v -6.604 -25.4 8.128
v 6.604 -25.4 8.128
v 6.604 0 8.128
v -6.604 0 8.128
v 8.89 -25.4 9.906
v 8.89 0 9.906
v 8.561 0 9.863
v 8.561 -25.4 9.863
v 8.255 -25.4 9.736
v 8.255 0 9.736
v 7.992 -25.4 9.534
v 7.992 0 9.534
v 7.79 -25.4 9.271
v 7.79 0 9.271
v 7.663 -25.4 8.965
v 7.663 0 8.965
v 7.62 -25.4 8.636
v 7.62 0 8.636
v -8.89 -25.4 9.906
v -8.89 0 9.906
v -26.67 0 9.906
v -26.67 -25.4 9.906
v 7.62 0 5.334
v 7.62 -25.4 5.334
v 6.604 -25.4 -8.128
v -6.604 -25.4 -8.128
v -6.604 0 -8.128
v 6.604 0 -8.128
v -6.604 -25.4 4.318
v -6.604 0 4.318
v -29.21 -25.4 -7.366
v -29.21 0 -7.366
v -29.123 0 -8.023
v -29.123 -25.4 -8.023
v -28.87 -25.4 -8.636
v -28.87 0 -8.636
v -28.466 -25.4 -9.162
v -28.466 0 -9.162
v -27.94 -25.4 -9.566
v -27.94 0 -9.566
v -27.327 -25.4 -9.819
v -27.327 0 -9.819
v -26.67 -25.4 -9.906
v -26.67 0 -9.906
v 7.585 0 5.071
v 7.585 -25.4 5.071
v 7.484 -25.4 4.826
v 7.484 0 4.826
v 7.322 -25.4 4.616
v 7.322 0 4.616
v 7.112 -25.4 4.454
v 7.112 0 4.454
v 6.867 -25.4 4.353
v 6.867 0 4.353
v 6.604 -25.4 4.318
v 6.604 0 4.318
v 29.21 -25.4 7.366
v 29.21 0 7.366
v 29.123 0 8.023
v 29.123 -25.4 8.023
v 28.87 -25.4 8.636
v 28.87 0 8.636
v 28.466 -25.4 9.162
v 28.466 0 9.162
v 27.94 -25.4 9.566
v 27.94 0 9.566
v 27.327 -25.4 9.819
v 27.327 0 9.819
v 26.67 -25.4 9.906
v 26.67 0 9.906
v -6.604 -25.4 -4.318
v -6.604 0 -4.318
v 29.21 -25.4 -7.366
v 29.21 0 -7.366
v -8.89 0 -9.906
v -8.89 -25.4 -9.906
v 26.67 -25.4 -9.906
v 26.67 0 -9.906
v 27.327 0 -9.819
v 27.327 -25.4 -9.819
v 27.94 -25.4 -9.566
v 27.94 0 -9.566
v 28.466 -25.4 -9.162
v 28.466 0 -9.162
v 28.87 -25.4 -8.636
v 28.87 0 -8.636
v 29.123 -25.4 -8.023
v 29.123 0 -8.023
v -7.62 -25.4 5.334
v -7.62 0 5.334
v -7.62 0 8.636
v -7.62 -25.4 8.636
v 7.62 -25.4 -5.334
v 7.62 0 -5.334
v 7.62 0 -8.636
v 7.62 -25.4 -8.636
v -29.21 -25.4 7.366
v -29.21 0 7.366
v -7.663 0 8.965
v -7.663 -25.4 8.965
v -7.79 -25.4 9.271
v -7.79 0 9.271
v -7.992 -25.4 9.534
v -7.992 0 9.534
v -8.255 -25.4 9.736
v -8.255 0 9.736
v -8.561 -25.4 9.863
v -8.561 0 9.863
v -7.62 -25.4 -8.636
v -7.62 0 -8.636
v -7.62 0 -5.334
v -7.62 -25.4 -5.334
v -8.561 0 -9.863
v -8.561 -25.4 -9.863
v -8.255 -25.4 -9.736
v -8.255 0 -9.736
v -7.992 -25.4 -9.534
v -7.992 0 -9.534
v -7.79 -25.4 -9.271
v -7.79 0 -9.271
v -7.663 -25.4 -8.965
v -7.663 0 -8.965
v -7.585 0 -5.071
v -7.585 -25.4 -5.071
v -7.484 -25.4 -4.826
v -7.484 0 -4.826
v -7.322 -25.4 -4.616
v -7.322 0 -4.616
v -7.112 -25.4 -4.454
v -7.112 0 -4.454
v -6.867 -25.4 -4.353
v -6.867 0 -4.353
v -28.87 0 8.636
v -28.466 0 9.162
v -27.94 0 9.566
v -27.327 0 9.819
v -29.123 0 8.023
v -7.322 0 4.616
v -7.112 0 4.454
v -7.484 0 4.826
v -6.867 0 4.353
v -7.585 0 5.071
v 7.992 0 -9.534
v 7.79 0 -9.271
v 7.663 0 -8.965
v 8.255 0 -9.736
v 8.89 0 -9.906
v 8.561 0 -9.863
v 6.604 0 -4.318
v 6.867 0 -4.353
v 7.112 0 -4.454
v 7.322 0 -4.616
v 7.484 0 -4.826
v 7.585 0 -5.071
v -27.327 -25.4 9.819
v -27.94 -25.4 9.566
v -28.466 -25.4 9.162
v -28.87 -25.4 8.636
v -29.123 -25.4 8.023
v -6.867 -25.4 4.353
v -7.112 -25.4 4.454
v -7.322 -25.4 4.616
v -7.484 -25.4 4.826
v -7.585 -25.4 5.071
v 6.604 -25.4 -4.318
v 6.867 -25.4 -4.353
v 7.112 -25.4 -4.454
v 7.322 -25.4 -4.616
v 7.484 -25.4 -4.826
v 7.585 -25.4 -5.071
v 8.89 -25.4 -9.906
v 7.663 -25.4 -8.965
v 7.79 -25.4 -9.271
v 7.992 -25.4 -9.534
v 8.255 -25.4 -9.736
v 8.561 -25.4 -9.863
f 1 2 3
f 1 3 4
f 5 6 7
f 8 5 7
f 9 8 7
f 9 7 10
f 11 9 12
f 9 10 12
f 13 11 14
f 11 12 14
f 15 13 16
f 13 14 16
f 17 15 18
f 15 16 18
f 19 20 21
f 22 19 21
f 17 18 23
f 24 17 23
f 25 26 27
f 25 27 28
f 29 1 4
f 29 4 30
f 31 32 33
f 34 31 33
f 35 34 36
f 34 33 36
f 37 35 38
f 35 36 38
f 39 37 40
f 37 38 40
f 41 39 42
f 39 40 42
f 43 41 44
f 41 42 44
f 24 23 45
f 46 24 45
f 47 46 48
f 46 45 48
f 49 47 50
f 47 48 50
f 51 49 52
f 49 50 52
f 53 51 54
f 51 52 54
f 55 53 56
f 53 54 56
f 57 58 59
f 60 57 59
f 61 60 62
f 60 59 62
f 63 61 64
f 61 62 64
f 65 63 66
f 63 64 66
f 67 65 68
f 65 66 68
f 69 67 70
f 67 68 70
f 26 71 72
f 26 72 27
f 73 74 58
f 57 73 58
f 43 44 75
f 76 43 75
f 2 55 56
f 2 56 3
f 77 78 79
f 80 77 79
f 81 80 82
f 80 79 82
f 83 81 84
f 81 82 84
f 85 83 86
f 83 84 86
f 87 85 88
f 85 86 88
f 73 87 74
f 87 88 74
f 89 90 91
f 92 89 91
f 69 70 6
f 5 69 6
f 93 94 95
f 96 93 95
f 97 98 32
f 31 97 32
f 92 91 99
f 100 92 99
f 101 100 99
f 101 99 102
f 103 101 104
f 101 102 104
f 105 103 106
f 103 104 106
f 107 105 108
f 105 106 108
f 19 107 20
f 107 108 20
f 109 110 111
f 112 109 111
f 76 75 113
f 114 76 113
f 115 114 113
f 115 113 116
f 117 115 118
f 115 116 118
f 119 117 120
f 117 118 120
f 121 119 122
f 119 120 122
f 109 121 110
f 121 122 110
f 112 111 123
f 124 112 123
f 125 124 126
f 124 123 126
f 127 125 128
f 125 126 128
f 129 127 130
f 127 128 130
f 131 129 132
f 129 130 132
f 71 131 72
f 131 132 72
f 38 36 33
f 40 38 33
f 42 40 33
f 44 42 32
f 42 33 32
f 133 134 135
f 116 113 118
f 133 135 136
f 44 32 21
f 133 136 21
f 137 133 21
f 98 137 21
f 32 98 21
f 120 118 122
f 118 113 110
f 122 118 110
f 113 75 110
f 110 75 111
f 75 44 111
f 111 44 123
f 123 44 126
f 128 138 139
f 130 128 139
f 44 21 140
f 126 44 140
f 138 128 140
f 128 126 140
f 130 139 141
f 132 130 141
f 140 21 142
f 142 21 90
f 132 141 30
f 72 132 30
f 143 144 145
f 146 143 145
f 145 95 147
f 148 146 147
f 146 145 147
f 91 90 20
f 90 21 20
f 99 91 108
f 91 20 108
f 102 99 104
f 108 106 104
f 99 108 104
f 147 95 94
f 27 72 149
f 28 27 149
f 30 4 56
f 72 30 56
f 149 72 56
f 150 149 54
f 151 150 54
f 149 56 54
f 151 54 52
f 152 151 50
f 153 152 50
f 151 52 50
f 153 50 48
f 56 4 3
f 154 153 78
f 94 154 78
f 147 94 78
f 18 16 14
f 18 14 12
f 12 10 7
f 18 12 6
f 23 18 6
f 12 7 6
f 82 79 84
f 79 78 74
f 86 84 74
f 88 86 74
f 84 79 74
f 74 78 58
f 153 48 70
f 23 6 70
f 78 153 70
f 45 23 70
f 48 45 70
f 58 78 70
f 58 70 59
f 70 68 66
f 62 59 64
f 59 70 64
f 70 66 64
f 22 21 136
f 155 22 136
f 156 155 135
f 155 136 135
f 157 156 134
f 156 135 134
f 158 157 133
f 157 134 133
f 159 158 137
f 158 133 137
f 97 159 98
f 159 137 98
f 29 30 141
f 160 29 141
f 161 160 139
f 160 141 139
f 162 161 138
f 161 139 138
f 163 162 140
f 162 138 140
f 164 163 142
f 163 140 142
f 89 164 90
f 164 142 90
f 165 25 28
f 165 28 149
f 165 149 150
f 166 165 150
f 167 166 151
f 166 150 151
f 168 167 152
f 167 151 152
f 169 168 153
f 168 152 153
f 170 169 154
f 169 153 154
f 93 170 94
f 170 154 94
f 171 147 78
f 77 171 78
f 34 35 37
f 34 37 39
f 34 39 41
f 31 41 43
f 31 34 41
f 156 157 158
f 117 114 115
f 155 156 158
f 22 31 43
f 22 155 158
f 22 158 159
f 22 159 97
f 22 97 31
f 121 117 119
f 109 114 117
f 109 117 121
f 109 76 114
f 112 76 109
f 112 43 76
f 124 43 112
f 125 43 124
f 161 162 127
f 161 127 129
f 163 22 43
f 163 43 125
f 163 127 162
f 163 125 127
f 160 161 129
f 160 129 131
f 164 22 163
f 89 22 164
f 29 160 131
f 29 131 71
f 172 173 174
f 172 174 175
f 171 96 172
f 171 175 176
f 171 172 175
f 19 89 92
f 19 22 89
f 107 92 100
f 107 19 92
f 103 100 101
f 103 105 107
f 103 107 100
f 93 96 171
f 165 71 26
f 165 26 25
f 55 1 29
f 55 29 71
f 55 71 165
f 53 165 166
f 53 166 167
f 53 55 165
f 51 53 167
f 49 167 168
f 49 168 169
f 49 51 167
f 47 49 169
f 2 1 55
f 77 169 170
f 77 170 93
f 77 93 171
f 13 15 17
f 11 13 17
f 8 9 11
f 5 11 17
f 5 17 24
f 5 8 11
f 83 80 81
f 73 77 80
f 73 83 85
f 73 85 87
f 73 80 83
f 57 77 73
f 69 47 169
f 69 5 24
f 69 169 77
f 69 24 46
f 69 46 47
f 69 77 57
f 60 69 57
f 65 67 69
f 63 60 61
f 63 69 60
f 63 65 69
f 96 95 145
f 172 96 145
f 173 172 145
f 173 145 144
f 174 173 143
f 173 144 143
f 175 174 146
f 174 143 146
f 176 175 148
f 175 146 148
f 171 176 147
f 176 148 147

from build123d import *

# Parameters (mm, degrees)
F1_DEPTH = 25.4


with BuildPart() as f1:
    # F0 (on Front) → F1 (new body)
    with BuildSketch(Plane.XZ):
        with BuildLine():
            Line((-29.21, 0), (0, 0))
            Line((0, 0), (0, 8.128))
            Line((0, 8.128), (-6.604, 8.128))
            Line((-6.604, 8.128), (-6.604, 4.318))
            ThreePointArc((-6.604, 4.318), (-7.32242, 4.61558), (-7.62, 5.334))
            Line((-7.62, 5.334), (-7.62, 8.636))
            ThreePointArc((-7.62, 8.636), (-7.991974, 9.534026), (-8.89, 9.906))
            Line((-8.89, 9.906), (-26.67, 9.906))
            ThreePointArc((-26.67, 9.906), (-28.466051, 9.162051), (-29.21, 7.366))
            Line((-29.21, 7.366), (-29.21, 0))
        make_face()
        with BuildLine():
            Line((0, 8.128), (0, 0))
            Line((0, 0), (29.21, 0))
            Line((29.21, 0), (29.21, 7.366))
            ThreePointArc((29.21, 7.366), (28.466051, 9.162051), (26.67, 9.906))
            Line((26.67, 9.906), (8.89, 9.906))
            ThreePointArc((8.89, 9.906), (7.991974, 9.534026), (7.62, 8.636))
            Line((7.62, 8.636), (7.62, 5.334))
            ThreePointArc((7.62, 5.334), (7.32242, 4.61558), (6.604, 4.318))
            Line((6.604, 4.318), (6.604, 8.128))
            Line((6.604, 8.128), (0, 8.128))
        make_face()
        with BuildLine():
            Line((29.21, 0), (0, 0))
            Line((0, 0), (0, -8.128))
            Line((0, -8.128), (6.604, -8.128))
            Line((6.604, -8.128), (6.604, -4.318))
            ThreePointArc((6.604, -4.318), (7.32242, -4.61558), (7.62, -5.334))
            Line((7.62, -5.334), (7.62, -8.636))
            ThreePointArc((7.62, -8.636), (7.991974, -9.534026), (8.89, -9.906))
            Line((8.89, -9.906), (26.67, -9.906))
            ThreePointArc((26.67, -9.906), (28.466051, -9.162051), (29.21, -7.366))
            Line((29.21, -7.366), (29.21, 0))
        make_face()
        with BuildLine():
            Line((0, -8.128), (0, 0))
            Line((0, 0), (-29.21, 0))
            Line((-29.21, 0), (-29.21, -7.366))
            ThreePointArc((-29.21, -7.366), (-28.466051, -9.162051), (-26.67, -9.906))
            Line((-26.67, -9.906), (-8.89, -9.906))
            ThreePointArc((-8.89, -9.906), (-7.991974, -9.534026), (-7.62, -8.636))
            Line((-7.62, -8.636), (-7.62, -5.334))
            ThreePointArc((-7.62, -5.334), (-7.32242, -4.61558), (-6.604, -4.318))
            Line((-6.604, -4.318), (-6.604, -8.128))
            Line((-6.604, -8.128), (0, -8.128))
        make_face()
    extrude(amount=F1_DEPTH)


solid = f1.part
